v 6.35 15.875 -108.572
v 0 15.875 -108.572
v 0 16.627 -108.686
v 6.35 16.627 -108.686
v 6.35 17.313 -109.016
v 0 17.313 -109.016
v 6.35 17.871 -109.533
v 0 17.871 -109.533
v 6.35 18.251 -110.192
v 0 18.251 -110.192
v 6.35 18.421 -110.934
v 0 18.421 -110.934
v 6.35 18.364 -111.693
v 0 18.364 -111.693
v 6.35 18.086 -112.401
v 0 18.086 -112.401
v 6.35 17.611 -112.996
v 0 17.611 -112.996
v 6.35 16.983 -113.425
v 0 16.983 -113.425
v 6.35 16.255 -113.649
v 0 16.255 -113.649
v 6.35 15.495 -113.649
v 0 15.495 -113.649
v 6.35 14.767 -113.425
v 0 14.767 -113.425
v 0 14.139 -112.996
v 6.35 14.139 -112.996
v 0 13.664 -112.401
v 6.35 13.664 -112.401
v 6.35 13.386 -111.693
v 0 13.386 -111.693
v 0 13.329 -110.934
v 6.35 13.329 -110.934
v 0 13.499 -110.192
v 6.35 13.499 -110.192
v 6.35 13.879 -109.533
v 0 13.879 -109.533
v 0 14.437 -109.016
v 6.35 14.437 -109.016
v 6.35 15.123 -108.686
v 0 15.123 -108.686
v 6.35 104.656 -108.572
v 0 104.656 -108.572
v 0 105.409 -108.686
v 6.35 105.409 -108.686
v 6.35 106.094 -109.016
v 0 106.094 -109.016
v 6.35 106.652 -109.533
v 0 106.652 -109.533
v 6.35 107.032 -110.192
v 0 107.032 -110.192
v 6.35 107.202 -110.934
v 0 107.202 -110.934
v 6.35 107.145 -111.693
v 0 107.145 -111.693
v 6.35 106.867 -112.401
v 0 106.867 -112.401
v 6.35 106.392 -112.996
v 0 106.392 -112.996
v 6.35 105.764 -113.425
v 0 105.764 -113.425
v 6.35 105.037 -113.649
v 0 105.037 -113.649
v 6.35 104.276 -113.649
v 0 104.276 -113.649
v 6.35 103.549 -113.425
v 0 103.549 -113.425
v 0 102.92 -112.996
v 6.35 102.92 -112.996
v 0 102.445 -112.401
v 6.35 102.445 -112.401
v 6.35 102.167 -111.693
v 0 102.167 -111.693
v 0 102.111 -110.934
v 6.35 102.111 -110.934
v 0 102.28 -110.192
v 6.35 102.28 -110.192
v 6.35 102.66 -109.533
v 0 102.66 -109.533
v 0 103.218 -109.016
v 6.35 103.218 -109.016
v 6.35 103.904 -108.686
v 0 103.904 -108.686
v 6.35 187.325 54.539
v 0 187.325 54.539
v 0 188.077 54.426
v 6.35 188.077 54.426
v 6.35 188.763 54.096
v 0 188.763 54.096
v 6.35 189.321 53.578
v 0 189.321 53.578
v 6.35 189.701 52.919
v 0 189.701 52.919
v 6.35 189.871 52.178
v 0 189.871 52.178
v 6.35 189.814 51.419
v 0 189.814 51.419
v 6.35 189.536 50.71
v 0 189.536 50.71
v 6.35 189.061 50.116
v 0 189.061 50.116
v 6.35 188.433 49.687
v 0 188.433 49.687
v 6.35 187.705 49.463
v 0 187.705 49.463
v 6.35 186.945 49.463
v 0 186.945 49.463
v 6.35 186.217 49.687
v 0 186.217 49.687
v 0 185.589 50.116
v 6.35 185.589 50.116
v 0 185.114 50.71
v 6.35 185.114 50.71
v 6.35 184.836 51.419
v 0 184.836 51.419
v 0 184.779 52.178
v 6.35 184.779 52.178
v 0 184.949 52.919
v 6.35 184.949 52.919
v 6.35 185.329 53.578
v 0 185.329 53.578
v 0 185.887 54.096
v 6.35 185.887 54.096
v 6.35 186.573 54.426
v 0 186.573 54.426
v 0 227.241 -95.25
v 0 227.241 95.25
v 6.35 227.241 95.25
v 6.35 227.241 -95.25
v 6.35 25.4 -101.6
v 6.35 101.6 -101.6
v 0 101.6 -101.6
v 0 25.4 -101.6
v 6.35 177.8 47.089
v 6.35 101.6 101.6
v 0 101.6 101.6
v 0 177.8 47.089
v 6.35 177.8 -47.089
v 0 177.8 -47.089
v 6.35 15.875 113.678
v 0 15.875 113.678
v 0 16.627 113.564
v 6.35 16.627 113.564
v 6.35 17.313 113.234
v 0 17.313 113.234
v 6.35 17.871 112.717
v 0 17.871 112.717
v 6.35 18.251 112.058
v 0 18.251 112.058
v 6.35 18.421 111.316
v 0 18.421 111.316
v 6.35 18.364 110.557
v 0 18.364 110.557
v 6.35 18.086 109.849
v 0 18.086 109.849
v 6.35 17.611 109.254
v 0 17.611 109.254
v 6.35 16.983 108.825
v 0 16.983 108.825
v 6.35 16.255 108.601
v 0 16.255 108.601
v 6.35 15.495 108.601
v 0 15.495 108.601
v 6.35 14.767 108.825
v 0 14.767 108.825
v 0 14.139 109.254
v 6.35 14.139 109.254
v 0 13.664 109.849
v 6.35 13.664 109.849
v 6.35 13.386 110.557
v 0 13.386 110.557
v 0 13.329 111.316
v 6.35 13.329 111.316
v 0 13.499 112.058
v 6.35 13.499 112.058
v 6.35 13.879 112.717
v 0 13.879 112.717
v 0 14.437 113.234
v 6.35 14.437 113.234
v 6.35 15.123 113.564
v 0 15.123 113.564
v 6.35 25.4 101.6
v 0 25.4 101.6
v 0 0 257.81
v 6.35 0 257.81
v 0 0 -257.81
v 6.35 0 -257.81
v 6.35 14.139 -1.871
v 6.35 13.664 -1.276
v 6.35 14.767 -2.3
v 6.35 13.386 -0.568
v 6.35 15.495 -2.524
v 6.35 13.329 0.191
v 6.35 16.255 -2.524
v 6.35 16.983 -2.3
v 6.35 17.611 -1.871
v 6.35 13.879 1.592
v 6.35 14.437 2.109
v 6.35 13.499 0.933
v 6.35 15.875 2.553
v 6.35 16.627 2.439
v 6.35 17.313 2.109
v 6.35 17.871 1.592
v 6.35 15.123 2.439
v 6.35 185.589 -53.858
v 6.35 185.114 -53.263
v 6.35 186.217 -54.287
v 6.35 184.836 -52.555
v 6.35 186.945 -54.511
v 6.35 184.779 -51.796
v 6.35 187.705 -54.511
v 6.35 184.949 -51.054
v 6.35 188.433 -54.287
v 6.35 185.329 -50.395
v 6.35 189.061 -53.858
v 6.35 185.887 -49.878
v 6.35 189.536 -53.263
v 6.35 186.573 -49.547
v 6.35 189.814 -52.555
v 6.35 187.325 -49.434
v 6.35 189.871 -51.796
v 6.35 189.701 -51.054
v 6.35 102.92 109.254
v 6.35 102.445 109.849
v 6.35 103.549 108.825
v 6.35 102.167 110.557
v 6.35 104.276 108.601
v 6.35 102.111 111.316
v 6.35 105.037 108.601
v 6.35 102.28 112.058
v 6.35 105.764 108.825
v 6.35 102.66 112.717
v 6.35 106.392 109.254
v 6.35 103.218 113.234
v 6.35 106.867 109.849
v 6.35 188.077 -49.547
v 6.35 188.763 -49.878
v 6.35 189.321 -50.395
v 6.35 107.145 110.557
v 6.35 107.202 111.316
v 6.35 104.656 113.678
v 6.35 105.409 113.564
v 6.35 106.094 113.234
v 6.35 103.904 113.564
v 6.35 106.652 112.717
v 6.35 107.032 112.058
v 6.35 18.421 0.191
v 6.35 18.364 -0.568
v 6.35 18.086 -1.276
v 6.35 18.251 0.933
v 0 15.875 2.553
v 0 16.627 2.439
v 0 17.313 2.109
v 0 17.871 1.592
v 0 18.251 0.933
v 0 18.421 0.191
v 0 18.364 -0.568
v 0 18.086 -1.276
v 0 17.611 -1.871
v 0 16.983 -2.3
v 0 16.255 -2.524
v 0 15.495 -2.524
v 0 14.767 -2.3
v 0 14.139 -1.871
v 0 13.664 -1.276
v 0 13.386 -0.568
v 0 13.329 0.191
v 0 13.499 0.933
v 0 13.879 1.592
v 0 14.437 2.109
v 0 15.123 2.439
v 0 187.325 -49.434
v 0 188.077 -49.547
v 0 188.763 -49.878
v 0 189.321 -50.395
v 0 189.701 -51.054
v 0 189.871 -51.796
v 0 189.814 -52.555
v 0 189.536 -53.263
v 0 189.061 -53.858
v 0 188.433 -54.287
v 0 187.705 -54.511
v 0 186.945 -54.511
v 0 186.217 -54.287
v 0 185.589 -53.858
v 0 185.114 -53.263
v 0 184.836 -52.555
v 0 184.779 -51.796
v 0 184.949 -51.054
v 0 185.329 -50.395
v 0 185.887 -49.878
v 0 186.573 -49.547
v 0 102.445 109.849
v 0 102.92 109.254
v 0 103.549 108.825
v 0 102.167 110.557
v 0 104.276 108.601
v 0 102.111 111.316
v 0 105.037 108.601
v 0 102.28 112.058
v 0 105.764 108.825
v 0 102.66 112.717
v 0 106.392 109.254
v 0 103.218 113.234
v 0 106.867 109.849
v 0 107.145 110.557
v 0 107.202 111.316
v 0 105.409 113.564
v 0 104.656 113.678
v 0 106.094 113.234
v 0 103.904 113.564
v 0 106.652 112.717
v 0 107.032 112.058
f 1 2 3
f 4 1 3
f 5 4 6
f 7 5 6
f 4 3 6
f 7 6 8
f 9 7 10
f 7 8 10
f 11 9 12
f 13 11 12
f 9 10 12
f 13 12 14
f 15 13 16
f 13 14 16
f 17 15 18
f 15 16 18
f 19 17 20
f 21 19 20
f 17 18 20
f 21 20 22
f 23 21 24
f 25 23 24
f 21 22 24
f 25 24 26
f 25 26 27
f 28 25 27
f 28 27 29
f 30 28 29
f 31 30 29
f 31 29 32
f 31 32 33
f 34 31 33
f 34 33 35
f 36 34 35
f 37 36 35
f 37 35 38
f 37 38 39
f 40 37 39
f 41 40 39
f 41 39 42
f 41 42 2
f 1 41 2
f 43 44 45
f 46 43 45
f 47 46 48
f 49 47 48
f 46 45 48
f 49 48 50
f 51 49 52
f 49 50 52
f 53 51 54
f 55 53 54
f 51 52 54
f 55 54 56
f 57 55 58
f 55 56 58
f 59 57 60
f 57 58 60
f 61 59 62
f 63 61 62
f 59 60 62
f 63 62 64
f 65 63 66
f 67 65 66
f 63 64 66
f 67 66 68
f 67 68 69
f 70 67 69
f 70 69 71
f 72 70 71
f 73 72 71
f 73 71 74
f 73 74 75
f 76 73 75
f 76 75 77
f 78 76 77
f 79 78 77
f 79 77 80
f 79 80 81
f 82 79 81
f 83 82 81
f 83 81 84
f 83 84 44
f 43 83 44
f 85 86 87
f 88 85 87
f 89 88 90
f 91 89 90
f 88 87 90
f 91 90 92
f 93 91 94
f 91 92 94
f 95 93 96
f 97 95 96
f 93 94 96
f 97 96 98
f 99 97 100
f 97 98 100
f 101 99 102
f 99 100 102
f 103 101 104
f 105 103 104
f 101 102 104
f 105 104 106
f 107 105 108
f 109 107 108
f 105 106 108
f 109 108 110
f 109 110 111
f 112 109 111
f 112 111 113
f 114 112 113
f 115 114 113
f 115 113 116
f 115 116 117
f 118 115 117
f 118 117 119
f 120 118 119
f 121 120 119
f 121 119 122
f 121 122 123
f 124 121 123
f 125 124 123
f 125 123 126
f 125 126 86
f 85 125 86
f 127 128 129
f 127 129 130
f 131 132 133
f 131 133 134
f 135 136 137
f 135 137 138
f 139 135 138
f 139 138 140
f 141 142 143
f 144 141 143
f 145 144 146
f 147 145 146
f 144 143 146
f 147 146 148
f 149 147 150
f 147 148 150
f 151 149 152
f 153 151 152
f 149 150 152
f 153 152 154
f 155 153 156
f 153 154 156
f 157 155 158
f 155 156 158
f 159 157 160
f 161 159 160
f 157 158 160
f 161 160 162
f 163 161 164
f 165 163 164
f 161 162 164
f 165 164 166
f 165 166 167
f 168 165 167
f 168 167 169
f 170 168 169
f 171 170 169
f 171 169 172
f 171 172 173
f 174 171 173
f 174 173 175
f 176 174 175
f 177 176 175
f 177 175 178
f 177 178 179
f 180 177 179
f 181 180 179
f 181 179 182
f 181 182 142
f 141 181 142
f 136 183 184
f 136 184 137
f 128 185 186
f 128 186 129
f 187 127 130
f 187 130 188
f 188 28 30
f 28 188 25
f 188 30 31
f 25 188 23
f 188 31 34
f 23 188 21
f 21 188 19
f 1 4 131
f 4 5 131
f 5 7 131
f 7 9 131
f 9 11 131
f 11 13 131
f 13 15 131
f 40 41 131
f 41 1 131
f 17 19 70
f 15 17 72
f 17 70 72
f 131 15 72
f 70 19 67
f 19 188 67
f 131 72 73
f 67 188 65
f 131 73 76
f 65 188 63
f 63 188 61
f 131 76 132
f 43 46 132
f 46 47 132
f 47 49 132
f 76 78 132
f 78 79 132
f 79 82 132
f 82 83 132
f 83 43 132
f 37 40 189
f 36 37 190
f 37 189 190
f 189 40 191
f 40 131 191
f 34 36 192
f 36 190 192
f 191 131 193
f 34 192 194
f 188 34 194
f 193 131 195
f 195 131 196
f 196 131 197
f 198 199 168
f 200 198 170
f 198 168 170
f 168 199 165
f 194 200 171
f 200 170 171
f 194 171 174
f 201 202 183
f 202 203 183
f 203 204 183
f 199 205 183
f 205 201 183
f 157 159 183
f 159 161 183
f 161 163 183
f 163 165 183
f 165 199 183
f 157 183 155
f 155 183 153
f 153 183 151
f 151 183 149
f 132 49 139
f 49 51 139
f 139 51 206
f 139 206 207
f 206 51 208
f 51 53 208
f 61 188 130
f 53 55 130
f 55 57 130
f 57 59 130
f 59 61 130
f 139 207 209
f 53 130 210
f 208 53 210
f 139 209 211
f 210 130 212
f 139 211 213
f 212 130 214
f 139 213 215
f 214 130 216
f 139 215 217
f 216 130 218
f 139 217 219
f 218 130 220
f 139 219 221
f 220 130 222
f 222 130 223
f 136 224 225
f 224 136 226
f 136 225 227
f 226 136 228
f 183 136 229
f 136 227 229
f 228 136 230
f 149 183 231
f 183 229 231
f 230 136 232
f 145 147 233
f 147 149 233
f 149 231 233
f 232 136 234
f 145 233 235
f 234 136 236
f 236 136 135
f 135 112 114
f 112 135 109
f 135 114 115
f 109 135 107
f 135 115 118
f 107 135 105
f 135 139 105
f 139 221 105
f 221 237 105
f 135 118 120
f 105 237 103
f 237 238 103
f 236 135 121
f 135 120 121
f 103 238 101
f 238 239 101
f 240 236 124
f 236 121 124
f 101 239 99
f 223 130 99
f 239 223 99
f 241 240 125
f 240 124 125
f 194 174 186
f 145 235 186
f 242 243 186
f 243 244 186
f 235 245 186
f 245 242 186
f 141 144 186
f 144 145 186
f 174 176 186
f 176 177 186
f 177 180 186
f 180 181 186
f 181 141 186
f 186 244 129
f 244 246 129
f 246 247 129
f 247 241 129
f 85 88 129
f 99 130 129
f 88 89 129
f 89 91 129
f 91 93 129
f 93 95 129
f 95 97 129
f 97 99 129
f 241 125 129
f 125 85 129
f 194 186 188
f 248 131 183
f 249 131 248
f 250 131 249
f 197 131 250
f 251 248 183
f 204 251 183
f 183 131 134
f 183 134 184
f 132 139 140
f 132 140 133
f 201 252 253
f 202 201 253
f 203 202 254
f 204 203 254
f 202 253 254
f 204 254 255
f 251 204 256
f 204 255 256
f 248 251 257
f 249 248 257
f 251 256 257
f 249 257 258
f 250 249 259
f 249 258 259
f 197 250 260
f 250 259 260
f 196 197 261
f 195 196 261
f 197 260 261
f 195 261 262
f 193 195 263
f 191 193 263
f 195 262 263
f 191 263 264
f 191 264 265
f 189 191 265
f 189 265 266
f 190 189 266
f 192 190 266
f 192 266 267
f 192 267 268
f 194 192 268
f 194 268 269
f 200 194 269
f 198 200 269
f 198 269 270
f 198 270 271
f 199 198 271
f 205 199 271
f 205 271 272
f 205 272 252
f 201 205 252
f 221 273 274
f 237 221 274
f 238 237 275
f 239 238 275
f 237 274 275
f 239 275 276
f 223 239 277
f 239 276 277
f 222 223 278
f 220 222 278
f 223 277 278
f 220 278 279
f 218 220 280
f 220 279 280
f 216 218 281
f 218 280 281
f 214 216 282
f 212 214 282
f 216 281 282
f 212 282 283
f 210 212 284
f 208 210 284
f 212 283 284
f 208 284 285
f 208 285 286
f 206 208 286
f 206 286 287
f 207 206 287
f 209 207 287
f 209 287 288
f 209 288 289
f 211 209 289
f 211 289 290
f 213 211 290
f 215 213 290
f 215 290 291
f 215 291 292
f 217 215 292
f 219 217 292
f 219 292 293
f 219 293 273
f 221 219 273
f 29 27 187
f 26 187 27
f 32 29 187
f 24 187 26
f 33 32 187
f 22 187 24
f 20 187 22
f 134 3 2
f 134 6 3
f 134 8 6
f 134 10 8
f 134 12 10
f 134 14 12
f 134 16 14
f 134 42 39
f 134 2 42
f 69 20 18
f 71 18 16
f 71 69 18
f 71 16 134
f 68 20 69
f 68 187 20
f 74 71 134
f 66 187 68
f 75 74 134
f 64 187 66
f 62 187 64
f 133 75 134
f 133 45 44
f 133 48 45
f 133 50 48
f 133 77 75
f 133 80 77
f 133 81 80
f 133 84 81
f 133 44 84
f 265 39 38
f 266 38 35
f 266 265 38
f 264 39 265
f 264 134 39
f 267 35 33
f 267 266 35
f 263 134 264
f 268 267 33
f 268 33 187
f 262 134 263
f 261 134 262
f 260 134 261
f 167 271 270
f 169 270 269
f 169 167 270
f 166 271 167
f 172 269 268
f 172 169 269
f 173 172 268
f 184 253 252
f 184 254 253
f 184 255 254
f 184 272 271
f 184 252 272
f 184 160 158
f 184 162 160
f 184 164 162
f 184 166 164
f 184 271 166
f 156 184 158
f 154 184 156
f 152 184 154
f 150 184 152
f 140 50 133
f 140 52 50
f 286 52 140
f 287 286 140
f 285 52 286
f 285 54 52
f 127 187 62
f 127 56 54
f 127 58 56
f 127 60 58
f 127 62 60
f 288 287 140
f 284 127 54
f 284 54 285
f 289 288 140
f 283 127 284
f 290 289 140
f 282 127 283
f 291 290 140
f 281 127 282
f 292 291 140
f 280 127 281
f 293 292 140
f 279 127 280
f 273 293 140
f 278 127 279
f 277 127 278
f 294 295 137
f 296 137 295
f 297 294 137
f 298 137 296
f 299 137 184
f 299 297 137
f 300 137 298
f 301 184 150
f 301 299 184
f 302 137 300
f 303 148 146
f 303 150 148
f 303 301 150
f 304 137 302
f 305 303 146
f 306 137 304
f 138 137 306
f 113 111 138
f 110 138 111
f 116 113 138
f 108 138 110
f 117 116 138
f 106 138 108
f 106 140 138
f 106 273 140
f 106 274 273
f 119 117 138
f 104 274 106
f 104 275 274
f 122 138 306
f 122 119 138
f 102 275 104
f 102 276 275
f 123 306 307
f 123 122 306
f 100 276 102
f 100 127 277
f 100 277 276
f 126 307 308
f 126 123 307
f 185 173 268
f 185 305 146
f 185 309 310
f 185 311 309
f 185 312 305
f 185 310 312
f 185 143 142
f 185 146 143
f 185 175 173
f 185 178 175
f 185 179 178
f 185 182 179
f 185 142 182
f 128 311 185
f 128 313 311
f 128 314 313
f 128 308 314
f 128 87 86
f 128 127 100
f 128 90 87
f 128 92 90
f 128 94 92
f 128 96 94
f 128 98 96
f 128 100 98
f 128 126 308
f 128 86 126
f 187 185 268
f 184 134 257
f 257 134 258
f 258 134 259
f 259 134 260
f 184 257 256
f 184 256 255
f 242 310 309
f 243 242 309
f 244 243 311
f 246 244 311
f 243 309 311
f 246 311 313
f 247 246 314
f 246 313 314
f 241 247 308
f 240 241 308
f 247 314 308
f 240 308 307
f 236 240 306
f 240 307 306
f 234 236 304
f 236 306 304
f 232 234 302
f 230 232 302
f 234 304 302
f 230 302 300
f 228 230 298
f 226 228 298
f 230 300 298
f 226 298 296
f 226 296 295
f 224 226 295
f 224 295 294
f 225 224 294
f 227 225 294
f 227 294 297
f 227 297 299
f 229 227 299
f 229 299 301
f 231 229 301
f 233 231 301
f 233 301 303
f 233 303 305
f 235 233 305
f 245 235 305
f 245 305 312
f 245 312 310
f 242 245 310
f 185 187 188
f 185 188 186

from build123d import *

# Parameters (mm, degrees)
BOSS_EXTRUDE1_DEPTH    = 6.35
CUT_EXTRUDE1_DEPTH     = 7.35
F_10_CLEARANCE_HOLE1_D = 5.1054


with BuildPart() as part:
    # Sketch1 → Boss-Extrude1 (new body)
    with BuildSketch(Plane(origin=(0, 0, 0), x_dir=(0, 0, -1), z_dir=(1, 0, 0))):
        Polygon((257.81, 0), (-257.81, 0), (-95.25, 227.241295543), (95.25, 227.241295543), align=None)
    extrude(amount=BOSS_EXTRUDE1_DEPTH)

    # Sketch3 → Cut-Extrude1 (cut, through all)
    with BuildSketch(Plane(origin=(6.35, 0, 0), x_dir=(0, 0, -1), z_dir=(1, 0, 0))):
        Polygon((-47.089344398, 177.8), (47.089344398, 177.8), (101.6, 101.6), (101.6, 25.4), (-101.6, 25.4), (-101.6, 101.6), align=None)
    extrude(amount=-CUT_EXTRUDE1_DEPTH, mode=Mode.SUBTRACT)

    # #10 Clearance Hole1 (through all)
    with Locations(Plane(origin=(6.35, 0, 0), x_dir=(0, 0, -1), z_dir=(1, 0, 0))):
        with Locations((51.986786112, 187.325), (-51.986786112, 187.325), (111.125, 104.656174089), (111.125, 15.875), (-111.125, 15.875), (-111.125, 104.656174089), (0, 15.875)):
            Hole(F_10_CLEARANCE_HOLE1_D / 2)


solid = part.part
